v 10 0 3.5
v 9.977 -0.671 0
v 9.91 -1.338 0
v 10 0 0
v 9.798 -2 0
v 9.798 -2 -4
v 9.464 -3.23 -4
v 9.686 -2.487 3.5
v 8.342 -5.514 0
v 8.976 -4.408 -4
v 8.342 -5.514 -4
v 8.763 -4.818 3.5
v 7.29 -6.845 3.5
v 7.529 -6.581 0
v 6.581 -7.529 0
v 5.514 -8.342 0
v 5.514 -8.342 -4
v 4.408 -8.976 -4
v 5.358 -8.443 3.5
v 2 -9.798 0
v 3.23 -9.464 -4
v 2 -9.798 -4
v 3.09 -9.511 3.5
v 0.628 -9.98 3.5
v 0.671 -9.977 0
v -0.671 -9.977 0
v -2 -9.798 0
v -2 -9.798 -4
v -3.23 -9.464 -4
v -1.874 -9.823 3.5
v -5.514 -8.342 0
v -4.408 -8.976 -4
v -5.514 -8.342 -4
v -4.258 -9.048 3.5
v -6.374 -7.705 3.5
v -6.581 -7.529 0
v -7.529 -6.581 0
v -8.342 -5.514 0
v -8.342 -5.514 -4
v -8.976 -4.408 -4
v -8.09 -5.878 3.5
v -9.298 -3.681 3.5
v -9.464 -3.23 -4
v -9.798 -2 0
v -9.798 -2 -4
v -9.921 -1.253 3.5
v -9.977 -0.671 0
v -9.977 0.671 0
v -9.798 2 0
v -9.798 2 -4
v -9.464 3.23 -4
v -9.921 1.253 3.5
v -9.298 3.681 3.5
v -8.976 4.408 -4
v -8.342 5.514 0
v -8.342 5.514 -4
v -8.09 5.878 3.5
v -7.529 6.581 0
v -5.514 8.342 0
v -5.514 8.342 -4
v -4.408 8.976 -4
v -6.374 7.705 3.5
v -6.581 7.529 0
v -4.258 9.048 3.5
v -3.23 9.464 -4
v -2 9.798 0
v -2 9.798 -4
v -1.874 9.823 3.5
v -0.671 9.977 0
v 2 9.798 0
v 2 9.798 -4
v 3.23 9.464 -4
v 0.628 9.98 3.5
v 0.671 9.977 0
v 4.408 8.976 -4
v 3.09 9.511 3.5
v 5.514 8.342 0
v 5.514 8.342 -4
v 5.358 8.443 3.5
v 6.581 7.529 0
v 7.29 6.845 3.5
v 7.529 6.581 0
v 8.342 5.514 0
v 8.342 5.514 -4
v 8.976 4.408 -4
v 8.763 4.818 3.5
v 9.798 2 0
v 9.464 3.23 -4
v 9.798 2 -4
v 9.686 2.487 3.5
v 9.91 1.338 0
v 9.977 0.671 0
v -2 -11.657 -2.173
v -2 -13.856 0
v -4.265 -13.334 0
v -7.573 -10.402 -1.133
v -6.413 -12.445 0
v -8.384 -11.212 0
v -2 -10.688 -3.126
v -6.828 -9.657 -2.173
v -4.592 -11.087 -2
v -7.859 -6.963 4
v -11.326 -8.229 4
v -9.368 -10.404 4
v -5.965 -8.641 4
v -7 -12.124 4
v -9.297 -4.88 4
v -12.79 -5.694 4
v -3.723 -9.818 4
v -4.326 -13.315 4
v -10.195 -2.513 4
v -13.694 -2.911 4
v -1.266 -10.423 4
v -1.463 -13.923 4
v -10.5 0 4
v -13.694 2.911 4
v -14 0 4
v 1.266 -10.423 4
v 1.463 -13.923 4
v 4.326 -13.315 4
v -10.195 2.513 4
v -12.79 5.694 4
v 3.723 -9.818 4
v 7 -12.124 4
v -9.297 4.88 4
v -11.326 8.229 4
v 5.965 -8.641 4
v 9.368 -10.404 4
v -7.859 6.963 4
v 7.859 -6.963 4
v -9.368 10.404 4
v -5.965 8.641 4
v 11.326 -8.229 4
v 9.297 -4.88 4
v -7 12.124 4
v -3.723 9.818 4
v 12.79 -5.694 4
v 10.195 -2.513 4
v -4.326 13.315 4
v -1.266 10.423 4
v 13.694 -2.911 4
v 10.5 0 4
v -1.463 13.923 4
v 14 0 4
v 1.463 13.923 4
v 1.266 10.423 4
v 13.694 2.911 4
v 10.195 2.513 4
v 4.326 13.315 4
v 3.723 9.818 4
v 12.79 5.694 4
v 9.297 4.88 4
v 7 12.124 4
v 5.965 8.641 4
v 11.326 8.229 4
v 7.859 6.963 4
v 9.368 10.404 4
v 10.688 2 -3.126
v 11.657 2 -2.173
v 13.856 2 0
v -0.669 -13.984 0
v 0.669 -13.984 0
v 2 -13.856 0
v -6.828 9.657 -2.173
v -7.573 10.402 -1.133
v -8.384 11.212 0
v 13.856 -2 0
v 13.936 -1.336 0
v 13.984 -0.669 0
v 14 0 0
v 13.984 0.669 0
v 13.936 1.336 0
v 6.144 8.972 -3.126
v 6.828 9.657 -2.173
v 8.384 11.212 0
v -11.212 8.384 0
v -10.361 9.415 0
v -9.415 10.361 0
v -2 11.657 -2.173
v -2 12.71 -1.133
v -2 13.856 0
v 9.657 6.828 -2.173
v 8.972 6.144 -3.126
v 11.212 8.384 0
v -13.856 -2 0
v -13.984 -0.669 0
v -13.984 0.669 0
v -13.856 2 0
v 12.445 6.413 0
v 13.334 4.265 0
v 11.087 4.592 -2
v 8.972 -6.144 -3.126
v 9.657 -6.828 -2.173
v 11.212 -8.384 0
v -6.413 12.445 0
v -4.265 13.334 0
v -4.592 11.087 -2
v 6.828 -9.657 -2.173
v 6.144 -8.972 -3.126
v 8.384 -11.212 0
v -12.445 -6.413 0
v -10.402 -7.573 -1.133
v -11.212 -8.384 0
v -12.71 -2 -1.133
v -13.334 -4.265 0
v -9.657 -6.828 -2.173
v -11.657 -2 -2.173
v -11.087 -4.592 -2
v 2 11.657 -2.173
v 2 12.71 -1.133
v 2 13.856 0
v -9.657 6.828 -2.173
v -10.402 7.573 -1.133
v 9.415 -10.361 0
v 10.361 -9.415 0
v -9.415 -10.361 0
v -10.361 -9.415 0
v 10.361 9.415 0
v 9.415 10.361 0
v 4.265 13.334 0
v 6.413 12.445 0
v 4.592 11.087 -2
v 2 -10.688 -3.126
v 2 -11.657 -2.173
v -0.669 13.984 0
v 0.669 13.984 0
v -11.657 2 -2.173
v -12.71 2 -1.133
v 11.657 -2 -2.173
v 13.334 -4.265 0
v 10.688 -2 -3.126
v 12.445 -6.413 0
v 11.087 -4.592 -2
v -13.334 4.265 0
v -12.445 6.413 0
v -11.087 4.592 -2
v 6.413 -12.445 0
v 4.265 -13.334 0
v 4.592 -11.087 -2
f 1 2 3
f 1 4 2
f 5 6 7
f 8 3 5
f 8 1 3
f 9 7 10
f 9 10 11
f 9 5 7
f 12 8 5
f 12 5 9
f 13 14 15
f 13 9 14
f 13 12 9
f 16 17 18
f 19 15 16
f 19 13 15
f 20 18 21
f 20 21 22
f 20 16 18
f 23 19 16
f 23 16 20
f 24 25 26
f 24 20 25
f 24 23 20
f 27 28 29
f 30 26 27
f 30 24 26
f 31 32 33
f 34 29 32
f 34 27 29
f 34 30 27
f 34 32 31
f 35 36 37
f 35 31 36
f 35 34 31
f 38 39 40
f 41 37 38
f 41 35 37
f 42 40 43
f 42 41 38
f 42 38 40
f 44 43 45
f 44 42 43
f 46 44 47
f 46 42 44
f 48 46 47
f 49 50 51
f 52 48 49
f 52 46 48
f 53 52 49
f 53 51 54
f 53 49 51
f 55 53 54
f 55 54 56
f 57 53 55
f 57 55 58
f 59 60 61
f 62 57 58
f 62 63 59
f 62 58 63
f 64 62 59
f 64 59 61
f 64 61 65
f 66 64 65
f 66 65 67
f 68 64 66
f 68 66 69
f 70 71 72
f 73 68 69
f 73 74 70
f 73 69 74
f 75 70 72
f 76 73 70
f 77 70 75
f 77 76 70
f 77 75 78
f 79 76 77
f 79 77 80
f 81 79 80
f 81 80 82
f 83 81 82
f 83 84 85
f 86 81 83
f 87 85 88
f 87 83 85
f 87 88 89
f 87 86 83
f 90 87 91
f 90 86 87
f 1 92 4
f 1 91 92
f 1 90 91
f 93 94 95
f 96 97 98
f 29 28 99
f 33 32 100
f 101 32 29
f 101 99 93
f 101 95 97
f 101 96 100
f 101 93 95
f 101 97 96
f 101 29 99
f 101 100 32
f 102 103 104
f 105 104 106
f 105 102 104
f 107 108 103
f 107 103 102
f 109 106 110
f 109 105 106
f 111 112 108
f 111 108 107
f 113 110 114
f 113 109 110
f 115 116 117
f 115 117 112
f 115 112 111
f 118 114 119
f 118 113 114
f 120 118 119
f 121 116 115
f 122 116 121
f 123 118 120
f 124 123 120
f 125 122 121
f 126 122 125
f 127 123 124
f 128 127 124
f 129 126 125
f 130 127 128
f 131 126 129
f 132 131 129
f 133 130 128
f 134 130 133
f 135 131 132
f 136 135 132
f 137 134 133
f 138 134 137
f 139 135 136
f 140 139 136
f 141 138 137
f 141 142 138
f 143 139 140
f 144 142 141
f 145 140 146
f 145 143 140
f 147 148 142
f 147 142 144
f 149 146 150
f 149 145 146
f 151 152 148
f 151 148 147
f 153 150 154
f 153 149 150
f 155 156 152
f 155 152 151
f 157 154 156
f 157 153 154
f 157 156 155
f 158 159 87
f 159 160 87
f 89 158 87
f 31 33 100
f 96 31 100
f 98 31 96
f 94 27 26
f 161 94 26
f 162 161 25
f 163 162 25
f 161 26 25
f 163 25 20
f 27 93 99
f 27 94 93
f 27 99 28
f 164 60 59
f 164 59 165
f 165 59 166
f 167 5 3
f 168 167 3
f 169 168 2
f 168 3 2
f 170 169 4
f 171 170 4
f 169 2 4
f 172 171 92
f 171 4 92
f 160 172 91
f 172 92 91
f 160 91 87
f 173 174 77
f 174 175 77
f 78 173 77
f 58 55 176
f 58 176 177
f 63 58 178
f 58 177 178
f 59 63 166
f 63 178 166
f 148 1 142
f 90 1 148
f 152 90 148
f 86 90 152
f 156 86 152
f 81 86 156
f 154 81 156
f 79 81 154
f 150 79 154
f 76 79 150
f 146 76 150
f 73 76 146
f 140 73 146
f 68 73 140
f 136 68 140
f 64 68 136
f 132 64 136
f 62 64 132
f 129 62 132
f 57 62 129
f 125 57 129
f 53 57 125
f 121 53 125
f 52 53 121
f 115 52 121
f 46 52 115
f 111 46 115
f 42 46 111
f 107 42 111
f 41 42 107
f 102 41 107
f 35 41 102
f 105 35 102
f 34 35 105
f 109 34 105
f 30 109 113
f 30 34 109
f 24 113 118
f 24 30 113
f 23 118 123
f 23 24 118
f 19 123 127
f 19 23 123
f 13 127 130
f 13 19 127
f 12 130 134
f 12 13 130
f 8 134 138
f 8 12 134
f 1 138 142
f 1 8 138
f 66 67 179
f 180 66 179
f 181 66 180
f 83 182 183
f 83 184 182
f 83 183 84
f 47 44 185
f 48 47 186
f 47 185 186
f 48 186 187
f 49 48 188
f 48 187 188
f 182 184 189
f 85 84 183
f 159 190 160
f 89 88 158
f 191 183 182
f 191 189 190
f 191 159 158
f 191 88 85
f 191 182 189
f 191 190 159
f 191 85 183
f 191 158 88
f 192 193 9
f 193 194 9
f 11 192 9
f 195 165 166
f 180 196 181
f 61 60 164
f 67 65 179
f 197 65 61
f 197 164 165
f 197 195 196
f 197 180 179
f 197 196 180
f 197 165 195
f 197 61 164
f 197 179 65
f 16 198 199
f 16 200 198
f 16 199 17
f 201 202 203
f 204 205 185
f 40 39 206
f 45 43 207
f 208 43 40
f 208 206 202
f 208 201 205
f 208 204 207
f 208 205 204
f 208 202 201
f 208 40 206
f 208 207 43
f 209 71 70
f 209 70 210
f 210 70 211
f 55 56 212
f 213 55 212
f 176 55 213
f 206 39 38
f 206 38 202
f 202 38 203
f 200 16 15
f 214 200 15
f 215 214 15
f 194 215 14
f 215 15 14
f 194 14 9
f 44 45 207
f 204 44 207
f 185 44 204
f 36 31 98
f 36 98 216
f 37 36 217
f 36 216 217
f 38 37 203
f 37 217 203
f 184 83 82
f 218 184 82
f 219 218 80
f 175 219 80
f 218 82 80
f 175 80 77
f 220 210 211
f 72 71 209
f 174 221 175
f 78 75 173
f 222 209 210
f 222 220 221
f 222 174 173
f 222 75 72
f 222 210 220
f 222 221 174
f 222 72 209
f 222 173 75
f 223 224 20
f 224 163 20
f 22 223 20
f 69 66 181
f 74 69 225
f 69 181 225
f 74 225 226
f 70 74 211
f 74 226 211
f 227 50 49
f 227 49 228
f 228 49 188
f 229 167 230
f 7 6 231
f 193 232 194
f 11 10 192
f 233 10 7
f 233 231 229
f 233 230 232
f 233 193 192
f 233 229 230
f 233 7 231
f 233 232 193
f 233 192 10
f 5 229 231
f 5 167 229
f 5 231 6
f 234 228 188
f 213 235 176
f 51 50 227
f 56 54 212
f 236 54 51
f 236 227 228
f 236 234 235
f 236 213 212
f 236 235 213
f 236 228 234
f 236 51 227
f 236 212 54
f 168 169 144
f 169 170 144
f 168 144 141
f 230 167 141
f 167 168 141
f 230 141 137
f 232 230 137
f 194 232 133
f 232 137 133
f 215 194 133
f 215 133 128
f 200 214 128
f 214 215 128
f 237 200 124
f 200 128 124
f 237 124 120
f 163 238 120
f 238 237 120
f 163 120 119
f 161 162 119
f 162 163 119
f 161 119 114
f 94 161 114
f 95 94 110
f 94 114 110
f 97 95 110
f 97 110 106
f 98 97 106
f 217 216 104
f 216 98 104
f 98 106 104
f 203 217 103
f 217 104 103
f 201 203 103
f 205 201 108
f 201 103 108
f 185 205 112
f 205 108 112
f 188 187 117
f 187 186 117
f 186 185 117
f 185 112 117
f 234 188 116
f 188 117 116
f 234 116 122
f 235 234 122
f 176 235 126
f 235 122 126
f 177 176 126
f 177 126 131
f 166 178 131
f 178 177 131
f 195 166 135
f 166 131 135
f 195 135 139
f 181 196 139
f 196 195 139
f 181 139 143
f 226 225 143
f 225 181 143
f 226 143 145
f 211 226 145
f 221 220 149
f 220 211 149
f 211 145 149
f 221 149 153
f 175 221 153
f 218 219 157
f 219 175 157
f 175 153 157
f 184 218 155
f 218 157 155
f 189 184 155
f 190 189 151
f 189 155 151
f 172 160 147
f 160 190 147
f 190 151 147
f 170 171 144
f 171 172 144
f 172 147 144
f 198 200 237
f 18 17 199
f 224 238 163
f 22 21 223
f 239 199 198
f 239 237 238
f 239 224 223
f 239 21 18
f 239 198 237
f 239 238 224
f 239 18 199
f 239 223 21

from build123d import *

# Parameters (mm, degrees)
F0_R            = 14
F0_R_2          = 10
F1_DEPTH        = 4
F2_R            = 14
F2_R_2          = 10
F3_DEPTH        = 4
F4_SIZE         = 0.5
F5_SIZE         = 3.99999
F6_W            = 4
F6_H            = 40
F7_DEPTH        = 4.001
F7_COPIES_COUNT = 4
F7_COPIES_ANGLE = 135


# Not quite as in the source:
# - a fillet or chamfer is up to 0.001 mm smaller than in the source, because OpenCascade refuses the exact size
# - a pattern or mirror of a feature is missing from the dataset's text; its kind, count and spacing are read off the source's solid


with BuildPart() as f1:
    # F0 (on Top) → F1 (new body)
    with BuildSketch(Plane.XY):
        Circle(F0_R)
        Circle(F0_R_2, mode=Mode.SUBTRACT)
    extrude(amount=F1_DEPTH)

    # F2 (on face) → F3 (join)
    with BuildSketch(Plane(origin=(0, 0, 0), x_dir=(1, 0, 0), z_dir=(0, 0, -1))):
        Circle(F2_R)
        Circle(F2_R_2, mode=Mode.SUBTRACT)
    extrude(amount=F3_DEPTH)

    # F4
    f4_edges = [f1.edges().sort_by_distance(p)[0] for p in [
        (-10, 0, 4),
    ]]
    chamfer(f4_edges, length=F4_SIZE)

    # F5 (size 4 in the source; OpenCascade refuses exactly that, so slightly less here)
    f5_edges = [f1.edges().sort_by_distance(p)[0] for p in [
        (-14, 0, -4),
    ]]
    chamfer(f5_edges, length=F5_SIZE)

    # F6 (on Top) → F7 (cut, through all)
    with BuildSketch(Plane.XY):
        Rectangle(F6_W, F6_H)
    f7 = extrude(amount=-F7_DEPTH, mode=Mode.SUBTRACT)

    # F7_copies: F7 ×4 about axis
    f7_copies_axis = Axis((0, 0, 0), (0, 0, 1))
    for i in range(1, F7_COPIES_COUNT):
        add(f7.rotate(f7_copies_axis, i * F7_COPIES_ANGLE / (F7_COPIES_COUNT - 1)), mode=Mode.SUBTRACT)


solid = f1.part
